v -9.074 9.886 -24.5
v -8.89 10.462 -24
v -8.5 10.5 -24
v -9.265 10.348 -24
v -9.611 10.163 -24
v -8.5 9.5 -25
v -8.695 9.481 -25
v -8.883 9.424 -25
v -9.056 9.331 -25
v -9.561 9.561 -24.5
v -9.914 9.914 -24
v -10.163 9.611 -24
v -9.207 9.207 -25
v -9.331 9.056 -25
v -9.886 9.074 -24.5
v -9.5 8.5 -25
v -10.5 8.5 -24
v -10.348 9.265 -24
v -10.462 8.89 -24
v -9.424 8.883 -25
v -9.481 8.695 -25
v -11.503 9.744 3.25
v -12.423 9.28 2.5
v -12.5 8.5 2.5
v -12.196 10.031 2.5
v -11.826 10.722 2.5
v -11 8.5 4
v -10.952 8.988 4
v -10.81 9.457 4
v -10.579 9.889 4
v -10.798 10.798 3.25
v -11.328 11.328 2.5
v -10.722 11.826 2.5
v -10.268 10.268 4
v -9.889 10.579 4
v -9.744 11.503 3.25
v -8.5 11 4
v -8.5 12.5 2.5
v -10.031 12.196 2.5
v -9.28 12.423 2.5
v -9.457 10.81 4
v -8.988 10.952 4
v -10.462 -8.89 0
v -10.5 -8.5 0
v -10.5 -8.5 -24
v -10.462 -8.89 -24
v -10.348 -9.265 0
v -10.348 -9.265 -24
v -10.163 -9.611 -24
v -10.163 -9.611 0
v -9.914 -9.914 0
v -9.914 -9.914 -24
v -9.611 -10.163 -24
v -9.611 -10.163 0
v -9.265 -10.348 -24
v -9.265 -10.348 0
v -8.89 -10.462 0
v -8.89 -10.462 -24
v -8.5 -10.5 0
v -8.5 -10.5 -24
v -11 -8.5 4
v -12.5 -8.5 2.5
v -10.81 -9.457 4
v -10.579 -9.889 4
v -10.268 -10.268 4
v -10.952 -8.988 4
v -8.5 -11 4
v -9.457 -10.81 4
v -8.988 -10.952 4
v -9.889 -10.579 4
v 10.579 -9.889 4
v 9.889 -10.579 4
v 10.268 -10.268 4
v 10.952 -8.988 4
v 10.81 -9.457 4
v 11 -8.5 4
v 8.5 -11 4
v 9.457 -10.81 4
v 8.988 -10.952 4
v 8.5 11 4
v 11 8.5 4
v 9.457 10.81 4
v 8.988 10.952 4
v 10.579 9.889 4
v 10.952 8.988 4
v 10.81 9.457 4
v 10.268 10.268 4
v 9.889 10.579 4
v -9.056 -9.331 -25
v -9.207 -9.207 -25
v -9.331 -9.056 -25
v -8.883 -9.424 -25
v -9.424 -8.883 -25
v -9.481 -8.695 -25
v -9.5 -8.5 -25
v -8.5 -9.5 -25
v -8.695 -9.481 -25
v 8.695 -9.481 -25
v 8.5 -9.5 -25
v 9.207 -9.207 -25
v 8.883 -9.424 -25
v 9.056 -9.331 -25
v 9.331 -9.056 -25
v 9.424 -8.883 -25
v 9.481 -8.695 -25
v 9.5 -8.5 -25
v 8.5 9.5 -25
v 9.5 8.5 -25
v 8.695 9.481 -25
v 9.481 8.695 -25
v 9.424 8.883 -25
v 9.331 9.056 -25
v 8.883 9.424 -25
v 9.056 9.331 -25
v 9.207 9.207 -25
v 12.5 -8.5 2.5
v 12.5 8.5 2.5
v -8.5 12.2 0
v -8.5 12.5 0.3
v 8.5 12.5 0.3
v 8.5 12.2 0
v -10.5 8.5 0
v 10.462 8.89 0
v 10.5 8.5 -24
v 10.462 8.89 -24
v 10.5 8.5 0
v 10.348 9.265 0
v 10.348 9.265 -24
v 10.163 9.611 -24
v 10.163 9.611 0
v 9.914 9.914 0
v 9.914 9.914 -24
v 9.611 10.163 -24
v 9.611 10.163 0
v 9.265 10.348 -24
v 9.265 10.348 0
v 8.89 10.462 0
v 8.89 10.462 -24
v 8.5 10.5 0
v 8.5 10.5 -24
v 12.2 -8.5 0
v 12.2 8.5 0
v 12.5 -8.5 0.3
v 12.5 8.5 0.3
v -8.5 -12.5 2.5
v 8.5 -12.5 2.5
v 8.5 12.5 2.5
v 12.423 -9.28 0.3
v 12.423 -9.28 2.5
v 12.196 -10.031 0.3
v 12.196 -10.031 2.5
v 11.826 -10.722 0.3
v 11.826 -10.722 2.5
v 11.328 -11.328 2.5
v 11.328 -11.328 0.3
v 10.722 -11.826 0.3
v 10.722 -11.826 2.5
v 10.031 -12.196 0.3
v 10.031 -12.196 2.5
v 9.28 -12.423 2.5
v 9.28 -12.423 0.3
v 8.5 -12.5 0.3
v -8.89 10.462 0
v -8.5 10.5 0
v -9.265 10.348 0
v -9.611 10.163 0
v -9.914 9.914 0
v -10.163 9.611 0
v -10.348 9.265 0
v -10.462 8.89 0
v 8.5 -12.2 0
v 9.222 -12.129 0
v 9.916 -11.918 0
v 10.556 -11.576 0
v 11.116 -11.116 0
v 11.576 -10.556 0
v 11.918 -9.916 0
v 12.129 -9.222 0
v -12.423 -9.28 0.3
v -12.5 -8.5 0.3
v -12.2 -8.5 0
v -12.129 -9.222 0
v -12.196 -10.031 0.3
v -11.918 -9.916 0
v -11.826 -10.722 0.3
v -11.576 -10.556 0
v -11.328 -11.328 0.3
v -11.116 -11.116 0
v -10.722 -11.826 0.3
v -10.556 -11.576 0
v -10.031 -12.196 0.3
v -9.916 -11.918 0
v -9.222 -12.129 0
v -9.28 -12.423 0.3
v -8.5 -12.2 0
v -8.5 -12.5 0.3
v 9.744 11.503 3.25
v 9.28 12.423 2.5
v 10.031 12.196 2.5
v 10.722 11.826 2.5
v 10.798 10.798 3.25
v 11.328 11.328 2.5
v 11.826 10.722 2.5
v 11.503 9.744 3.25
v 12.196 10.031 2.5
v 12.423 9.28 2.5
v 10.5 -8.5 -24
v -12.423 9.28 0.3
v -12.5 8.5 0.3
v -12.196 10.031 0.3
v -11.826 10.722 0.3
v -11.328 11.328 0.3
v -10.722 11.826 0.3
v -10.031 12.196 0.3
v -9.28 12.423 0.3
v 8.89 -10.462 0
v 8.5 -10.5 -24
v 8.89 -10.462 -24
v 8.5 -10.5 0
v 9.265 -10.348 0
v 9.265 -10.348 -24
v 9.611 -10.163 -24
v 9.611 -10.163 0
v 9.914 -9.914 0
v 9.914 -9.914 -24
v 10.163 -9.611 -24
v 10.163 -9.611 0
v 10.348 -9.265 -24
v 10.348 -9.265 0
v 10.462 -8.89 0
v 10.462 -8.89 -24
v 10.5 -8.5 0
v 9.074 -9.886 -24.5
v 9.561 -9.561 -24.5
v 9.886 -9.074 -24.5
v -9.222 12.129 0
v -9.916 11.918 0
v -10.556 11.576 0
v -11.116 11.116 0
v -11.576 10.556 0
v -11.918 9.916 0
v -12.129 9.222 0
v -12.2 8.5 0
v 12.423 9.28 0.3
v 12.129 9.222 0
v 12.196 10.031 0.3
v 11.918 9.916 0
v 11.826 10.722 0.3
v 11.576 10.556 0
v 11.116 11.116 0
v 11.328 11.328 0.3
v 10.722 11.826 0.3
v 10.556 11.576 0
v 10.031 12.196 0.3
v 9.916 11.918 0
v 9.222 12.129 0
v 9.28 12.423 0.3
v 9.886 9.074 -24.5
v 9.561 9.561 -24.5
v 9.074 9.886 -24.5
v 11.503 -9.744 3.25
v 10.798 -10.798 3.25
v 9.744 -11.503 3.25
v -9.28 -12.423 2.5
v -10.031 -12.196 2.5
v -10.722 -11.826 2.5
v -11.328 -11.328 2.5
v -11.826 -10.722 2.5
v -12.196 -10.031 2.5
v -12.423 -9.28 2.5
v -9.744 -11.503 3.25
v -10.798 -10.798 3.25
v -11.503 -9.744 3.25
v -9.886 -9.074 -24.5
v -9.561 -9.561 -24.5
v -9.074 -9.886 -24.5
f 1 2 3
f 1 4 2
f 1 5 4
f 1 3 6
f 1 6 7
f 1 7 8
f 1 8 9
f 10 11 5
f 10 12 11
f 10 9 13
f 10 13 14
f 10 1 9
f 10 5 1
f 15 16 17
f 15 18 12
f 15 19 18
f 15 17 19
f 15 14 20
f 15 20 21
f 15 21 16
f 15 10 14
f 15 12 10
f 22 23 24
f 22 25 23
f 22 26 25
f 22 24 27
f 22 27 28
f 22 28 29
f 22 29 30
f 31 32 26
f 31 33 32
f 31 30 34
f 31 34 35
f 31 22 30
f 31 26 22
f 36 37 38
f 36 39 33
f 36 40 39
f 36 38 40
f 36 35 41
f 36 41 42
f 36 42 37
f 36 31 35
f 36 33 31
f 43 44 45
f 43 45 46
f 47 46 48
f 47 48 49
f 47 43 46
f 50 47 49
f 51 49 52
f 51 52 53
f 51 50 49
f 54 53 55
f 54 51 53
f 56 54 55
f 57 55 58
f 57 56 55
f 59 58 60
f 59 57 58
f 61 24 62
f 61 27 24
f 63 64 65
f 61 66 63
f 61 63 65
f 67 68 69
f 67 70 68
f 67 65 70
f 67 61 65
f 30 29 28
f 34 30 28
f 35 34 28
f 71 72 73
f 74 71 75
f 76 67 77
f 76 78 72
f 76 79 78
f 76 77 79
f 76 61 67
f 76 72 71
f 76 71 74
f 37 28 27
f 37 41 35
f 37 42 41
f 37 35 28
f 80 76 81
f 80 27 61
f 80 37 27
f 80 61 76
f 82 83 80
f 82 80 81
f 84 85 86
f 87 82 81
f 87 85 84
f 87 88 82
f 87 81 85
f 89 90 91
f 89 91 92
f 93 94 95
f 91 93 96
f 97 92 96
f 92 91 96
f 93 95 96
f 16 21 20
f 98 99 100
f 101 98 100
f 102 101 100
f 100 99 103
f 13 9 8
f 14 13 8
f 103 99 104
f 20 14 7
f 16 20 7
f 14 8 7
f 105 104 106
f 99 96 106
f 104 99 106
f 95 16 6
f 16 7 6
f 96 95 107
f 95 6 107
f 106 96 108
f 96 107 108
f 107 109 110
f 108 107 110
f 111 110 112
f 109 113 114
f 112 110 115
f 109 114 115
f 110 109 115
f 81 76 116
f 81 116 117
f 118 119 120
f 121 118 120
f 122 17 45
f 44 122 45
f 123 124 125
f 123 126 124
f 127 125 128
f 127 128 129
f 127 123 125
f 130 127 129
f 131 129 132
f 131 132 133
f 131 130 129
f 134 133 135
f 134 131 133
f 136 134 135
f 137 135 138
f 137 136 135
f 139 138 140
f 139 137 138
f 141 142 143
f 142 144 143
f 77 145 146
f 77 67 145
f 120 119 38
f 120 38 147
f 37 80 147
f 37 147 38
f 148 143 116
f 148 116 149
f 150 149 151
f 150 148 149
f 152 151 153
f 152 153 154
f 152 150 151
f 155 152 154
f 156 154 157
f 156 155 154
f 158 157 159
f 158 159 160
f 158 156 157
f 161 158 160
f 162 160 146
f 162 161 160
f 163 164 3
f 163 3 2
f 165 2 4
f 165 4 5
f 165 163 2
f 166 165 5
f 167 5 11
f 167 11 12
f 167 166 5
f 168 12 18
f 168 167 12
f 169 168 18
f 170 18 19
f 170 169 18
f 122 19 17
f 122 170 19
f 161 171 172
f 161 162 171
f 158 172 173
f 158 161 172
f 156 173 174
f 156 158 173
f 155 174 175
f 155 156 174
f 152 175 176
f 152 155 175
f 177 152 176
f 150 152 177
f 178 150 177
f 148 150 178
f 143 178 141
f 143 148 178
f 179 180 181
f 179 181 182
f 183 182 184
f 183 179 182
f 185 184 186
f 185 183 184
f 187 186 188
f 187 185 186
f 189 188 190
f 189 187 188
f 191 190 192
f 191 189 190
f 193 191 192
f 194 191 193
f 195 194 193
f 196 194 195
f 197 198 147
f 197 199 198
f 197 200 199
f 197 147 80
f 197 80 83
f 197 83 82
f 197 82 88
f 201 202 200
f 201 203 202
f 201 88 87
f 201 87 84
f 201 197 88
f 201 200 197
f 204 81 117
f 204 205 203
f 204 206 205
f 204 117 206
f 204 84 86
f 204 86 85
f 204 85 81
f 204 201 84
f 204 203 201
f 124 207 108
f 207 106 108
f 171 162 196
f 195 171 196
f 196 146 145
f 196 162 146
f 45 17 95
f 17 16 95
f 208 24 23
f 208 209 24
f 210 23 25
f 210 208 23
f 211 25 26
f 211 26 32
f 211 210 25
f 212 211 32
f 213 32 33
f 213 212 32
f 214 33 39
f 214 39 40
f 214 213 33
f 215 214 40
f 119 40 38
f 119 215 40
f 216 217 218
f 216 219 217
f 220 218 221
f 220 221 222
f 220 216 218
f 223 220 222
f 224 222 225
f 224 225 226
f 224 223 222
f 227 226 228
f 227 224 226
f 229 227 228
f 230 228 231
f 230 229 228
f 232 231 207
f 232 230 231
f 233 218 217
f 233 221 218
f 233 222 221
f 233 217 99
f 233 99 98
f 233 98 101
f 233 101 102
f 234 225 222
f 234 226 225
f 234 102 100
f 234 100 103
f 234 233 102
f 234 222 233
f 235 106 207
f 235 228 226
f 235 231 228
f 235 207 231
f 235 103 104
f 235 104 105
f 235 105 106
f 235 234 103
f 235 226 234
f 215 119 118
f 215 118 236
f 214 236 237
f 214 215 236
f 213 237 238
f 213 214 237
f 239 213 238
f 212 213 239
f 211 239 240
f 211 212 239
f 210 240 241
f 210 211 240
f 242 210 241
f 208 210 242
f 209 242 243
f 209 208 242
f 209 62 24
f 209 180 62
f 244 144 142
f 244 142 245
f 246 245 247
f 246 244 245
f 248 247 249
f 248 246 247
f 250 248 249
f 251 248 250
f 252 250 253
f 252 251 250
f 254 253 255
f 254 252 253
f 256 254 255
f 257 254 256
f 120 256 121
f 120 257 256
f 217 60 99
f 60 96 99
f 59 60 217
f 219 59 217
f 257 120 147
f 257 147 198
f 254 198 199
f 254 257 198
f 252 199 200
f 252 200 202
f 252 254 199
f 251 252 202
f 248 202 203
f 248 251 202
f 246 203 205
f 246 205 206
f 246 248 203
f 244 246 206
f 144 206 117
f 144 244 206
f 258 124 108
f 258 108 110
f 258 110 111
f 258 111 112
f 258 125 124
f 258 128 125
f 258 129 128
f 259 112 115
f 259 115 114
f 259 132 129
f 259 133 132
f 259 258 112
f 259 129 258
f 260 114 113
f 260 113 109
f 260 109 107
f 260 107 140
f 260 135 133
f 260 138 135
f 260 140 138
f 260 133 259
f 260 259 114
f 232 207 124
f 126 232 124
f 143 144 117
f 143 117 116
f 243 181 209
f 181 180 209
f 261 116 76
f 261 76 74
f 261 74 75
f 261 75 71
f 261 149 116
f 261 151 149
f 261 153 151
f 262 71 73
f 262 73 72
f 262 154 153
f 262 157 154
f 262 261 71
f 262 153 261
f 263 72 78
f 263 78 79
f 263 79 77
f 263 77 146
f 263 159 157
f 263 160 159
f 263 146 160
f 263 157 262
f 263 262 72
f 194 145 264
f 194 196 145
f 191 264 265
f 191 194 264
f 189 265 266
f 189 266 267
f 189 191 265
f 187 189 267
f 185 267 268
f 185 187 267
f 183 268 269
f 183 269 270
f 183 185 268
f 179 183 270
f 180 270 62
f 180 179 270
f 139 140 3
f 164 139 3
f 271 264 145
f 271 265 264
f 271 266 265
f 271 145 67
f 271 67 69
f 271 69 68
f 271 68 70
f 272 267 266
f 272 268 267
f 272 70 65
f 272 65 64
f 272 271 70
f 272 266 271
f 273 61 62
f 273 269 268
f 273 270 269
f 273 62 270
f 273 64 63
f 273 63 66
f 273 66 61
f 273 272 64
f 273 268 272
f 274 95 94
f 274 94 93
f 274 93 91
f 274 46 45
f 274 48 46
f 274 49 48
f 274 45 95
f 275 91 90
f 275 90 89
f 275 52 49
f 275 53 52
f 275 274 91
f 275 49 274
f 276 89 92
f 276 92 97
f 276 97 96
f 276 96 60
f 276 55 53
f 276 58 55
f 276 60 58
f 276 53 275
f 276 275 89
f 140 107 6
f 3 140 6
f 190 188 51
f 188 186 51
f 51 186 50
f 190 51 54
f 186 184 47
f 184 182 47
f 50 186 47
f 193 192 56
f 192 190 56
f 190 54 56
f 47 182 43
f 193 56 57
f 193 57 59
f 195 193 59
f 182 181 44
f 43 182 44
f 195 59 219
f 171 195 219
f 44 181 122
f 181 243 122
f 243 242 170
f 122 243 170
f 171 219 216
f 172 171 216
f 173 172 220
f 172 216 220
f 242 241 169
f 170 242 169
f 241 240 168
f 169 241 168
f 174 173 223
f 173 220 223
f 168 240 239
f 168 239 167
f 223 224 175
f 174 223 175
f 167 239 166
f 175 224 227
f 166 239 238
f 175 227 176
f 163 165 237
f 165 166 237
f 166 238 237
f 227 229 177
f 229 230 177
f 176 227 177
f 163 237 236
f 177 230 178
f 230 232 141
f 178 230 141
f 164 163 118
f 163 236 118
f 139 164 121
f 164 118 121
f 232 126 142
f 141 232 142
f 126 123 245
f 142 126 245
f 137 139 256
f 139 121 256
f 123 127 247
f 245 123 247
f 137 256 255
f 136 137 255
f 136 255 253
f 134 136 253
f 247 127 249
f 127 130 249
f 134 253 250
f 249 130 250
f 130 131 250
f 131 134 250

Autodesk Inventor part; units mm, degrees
ref_plane "YZ Plane" through (0, 0, 0) normal (1, 0, 0) x (0, 1, 0)
ref_plane "XZ Plane" through (0, 0, 0) normal (0, 1, 0) x (-1, 0, 0)
ref_plane "XY Plane" through (0, 0, 0) normal (0, 0, 1) x (1, 0, 0)
sketch "Sketch1" plane through (0, 0, 0) normal (0, 0, 1) x (1, 0, 0)
  line L0 (8.5, 10.5) -> (-8.5, 10.5) projected
  line L1 (8.5, 10.5) -> (-8.5, 10.5) projected
  arc A0 (10.5, 8.5) -> (8.5, 10.5) centre (8.5, 8.5) ccw projected
  line L2 (10.5, -8.5) -> (10.5, 8.5) projected
  arc A1 (8.5, -10.5) -> (10.5, -8.5) centre (8.5, -8.5) ccw projected
  line L3 (-8.5, -10.5) -> (8.5, -10.5) projected
  arc A2 (-10.5, -8.5) -> (-8.5, -10.5) centre (-8.5, -8.5) ccw projected
  line L4 (-10.5, 8.5) -> (-10.5, -8.5) projected
  arc A3 (-8.5, 10.5) -> (-10.5, 8.5) centre (-8.5, 8.5) ccw projected
  line L5 (-12.5, -8.5) -> (-12.5, 8.5) projected
  arc A4 (-12.5, -8.5) -> (-8.5, -12.5) centre (-8.5, -8.5) ccw projected
  line L6 (8.5, -12.5) -> (-8.5, -12.5) projected
  arc A5 (8.5, -12.5) -> (12.5, -8.5) centre (8.5, -8.5) ccw projected
  line L7 (12.5, 8.5) -> (12.5, -8.5) projected
  arc A6 (12.5, 8.5) -> (8.5, 12.5) centre (8.5, 8.5) ccw projected
  line L8 (-8.5, 12.5) -> (8.5, 12.5) projected
  arc A7 (-8.5, 12.5) -> (-12.5, 8.5) centre (-8.5, 8.5) ccw projected
  point P0 (0, 0)
extrude "Extrusion1" add sketch "Sketch1" against normal blind 25 contours A0 L2 A1 L3 A2 L4 A3 L0
sketch "Sketch2" plane through (0, 0, 0) normal (0, 0, 1) x (1, 0, 0)
  line L0 (8.5, 10.5) -> (-8.5, 10.5) projected
  arc A0 (10.5, 8.5) -> (8.5, 10.5) centre (8.5, 8.5) ccw projected
  line L1 (10.5, -8.5) -> (10.5, 8.5) projected
  arc A1 (8.5, -10.5) -> (10.5, -8.5) centre (8.5, -8.5) ccw projected
  line L2 (-8.5, -10.5) -> (8.5, -10.5) projected
  arc A2 (-10.5, -8.5) -> (-8.5, -10.5) centre (-8.5, -8.5) ccw projected
  line L3 (-10.5, 8.5) -> (-10.5, -8.5) projected
  arc A3 (-8.5, 10.5) -> (-10.5, 8.5) centre (-8.5, 8.5) ccw projected
  line L4 (-12.5, -8.5) -> (-12.5, 8.5) projected
  arc A4 (-12.5, -8.5) -> (-8.5, -12.5) centre (-8.5, -8.5) ccw projected
  line L5 (8.5, -12.5) -> (-8.5, -12.5) projected
  arc A5 (8.5, -12.5) -> (12.5, -8.5) centre (8.5, -8.5) ccw projected
  line L6 (12.5, 8.5) -> (12.5, -8.5) projected
  arc A6 (12.5, 8.5) -> (8.5, 12.5) centre (8.5, 8.5) ccw projected
  line L7 (-8.5, 12.5) -> (8.5, 12.5) projected
  arc A7 (-8.5, 12.5) -> (-12.5, 8.5) centre (-8.5, 8.5) ccw projected
  point P0 (0, 0)
extrude "Extrusion2" add sketch "Sketch2" along normal blind 4 contours A0 L1 A1 L2 A2 L3 A3 L0 | L4 A7 L7 A6 L6 A5 L5 A4
chamfer "Chamfer1" distance 1 angle 45 8 edges at (0, 10.5, -25) (9.9142, 9.9142, -25) (10.5, 0, -25) (9.9142, -9.9142, -25) (0, -10.5, -25) (-9.9142, -9.9142, -25) (-10.5, 0, -25) (-9.9142, 9.9142, -25)
chamfer "Chamfer2" distance 1.5 angle 45 8 edges at (0, 12.5, 4) (-11.3284, 11.3284, 4) (-12.5, 0, 4) (-11.3284, -11.3284, 4) (0, -12.5, 4) (11.3284, -11.3284, 4) (12.5, 0, 4) (11.3284, 11.3284, 4)
chamfer "Chamfer3" distance 0.3 angle 45 8 edges at (0, 12.5, 0) (11.3284, 11.3284, 0) (12.5, 0, 0) (11.3284, -11.3284, 0) (0, -12.5, 0) (-11.3284, -11.3284, 0) (-12.5, 0, 0) (-11.3284, 11.3284, 0)
properties part number "nút nhựa bit hộp thép 25x25"
